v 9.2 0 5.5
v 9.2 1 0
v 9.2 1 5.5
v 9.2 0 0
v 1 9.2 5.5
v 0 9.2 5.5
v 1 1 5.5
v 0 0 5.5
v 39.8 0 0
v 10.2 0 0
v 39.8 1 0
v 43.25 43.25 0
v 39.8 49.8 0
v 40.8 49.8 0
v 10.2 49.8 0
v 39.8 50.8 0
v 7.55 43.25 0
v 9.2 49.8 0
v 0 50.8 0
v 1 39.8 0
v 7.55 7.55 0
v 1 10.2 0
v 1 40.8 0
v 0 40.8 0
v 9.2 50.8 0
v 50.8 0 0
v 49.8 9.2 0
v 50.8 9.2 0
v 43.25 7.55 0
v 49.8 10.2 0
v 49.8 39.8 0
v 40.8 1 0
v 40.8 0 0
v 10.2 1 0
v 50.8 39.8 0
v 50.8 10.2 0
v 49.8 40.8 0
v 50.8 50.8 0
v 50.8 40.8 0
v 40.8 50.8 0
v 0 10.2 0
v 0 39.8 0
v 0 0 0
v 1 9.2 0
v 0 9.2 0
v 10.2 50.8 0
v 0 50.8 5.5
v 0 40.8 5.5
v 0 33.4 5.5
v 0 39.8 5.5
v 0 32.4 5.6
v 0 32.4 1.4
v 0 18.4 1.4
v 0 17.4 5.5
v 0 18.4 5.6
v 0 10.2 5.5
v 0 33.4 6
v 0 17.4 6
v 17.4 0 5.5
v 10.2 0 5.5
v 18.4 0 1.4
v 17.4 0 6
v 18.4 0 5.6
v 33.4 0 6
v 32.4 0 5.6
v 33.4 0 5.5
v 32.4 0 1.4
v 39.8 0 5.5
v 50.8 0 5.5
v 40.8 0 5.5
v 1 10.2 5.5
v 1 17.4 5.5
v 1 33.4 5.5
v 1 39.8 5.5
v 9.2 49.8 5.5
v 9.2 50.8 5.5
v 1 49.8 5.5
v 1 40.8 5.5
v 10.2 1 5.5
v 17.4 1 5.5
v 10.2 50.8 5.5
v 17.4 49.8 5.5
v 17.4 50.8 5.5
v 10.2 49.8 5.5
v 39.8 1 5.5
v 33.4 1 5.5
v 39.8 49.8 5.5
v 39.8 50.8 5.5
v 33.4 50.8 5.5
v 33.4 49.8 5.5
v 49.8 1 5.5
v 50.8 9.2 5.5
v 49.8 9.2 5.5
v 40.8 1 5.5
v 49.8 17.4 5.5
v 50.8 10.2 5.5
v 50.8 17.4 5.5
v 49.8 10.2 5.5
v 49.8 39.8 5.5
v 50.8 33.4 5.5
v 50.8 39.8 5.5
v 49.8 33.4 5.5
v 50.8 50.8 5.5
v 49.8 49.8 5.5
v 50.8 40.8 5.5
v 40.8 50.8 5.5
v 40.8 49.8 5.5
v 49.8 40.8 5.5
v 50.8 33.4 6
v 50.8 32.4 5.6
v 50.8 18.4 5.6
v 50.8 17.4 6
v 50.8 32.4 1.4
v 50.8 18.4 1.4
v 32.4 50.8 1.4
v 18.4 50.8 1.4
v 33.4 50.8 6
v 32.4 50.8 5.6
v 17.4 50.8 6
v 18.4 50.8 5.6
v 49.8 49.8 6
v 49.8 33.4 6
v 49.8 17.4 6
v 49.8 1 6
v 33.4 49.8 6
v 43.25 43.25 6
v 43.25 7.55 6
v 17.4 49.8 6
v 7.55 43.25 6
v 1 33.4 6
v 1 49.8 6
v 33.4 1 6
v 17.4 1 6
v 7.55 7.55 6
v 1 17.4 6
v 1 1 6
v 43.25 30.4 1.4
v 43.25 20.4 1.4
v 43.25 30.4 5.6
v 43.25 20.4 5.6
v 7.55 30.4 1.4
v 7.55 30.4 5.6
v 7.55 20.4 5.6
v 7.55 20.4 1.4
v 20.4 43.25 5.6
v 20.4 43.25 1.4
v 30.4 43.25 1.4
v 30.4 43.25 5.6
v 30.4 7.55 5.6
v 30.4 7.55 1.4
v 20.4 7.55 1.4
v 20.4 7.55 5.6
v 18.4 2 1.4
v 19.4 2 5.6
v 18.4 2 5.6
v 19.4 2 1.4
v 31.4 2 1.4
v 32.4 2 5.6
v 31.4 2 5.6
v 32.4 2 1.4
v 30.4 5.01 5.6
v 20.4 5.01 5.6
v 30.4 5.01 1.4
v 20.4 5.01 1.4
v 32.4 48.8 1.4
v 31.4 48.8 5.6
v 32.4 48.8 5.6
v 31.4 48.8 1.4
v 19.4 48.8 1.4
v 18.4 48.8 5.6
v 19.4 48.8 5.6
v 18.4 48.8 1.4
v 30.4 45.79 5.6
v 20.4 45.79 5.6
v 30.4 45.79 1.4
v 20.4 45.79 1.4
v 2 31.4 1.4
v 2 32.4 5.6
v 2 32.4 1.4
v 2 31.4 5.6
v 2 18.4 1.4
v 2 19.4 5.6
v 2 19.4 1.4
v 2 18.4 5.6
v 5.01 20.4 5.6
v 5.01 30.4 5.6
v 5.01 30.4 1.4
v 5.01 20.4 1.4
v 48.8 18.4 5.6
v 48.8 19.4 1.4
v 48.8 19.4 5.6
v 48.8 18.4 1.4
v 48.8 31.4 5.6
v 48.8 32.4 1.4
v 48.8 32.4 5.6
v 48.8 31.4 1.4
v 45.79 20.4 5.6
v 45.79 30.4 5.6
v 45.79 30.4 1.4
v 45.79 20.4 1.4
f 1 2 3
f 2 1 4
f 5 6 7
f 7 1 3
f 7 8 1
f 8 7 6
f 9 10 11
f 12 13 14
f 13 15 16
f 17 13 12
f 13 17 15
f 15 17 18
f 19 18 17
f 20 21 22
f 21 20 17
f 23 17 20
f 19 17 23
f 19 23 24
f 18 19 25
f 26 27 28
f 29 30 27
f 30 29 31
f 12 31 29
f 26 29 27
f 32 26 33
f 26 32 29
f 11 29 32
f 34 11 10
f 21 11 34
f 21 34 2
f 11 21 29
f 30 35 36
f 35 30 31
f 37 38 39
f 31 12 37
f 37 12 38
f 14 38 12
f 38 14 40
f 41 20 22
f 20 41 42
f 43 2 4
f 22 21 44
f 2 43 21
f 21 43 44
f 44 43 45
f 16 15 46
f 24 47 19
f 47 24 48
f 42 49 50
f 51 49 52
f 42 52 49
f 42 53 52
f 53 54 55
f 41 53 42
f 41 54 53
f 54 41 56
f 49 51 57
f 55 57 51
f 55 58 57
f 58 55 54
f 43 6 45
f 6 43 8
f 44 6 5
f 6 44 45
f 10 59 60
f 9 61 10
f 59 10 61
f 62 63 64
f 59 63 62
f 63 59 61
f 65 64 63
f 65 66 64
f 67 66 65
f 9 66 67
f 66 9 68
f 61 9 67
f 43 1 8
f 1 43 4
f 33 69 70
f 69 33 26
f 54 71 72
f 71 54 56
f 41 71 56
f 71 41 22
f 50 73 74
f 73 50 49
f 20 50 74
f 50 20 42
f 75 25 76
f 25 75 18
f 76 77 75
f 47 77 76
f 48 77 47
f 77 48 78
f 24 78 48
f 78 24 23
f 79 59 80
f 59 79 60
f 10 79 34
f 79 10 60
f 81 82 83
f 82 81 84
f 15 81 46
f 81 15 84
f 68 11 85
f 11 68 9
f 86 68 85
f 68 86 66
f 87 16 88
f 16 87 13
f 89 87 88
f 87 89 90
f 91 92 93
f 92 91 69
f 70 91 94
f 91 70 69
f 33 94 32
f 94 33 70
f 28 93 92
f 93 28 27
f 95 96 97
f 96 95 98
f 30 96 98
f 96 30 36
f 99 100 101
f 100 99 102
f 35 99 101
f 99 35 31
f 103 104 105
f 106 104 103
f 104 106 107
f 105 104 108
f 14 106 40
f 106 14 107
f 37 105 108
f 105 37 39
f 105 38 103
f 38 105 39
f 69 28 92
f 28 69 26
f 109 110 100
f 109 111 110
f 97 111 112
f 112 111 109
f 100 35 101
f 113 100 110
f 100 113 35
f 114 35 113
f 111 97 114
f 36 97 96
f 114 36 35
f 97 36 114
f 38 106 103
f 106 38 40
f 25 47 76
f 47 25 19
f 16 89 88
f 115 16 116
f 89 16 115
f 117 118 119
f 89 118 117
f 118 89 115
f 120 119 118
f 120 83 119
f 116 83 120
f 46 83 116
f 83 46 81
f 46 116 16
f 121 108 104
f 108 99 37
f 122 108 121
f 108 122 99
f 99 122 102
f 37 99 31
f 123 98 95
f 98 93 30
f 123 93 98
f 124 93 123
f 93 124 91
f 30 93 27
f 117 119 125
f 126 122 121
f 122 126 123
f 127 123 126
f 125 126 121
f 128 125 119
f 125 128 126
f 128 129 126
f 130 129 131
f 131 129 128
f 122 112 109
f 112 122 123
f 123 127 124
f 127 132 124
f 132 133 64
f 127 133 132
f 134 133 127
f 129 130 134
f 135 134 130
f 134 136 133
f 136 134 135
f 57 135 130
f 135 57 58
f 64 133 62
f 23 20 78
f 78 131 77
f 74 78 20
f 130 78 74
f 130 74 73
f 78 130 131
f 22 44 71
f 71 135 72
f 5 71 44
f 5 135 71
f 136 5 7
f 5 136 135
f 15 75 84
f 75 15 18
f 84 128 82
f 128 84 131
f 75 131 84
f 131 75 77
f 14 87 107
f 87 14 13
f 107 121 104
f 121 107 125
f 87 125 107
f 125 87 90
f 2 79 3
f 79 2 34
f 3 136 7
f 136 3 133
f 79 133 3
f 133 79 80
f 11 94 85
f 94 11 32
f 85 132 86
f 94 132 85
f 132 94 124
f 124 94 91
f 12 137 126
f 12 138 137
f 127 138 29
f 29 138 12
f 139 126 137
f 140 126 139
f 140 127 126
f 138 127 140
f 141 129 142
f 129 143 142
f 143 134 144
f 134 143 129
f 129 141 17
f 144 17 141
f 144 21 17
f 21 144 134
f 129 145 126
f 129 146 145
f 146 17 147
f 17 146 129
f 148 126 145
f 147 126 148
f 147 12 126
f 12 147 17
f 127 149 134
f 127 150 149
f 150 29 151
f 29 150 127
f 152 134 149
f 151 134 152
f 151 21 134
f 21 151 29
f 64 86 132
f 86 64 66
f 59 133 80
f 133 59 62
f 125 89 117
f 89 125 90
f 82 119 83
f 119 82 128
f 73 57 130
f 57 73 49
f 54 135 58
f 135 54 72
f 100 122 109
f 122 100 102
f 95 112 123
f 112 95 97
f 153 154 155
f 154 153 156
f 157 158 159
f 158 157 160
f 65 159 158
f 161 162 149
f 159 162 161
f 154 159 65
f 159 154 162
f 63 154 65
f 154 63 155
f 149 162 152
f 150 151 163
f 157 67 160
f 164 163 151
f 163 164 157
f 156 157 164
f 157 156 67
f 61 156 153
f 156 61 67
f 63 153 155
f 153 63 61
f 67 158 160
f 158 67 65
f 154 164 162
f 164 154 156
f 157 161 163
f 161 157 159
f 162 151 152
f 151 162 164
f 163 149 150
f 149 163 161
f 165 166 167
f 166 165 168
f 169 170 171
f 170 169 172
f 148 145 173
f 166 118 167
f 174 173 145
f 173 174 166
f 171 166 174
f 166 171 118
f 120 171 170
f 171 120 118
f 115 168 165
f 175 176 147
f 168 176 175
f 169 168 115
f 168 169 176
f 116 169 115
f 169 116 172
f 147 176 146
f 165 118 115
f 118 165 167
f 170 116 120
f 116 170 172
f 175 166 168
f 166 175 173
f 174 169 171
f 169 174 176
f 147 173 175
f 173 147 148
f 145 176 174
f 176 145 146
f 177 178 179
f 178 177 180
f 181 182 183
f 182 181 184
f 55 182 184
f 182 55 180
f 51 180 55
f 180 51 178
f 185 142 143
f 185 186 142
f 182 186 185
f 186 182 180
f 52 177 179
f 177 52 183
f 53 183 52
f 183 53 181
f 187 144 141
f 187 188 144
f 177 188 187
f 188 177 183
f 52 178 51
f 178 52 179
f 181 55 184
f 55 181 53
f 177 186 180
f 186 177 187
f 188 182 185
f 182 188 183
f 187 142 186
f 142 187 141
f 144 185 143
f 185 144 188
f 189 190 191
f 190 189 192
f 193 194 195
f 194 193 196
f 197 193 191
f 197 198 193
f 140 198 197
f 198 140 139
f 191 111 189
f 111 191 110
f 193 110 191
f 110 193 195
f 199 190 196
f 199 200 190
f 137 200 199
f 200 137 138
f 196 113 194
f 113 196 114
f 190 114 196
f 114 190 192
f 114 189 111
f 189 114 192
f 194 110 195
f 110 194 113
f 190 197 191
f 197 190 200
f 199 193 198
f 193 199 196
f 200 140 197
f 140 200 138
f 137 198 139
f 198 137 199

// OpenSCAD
/* [Base Tile Size] */
x = 2; //[1,2,3,4,5,6]
y = 2; //[1,2,3,4,5,6]

/* [Square Basis] */
// What is the size in mm of a square?
square_basis = 25.4; // [25:Dwarven Forge/Hirstarts, 25.4:OpenLOCK, 31.75:Wyloch]

/*
 * Openlock connection bay
 */

module openlock_chamber(buffer=0) {
    translate([-buffer,-7,1.4]) cube([2+buffer,7*2,4.2]);
    hull() {
        translate([0,-6,1.4]) cube([2,6*2,4.2]);
        translate([3+0.01,-5,1.4]) cube([2,5*2,4.2]);
    }
    translate([5,-5,1.4]) cube([4,5*2,4.2]);
}

module openlock_supports(buffer=0) {
    translate([0-buffer*2,-0.5,1.4-buffer]) cube([10+buffer*2,1,4.2+buffer*2]);
}

module openlock_negative() {
    difference() {
        openlock_chamber(1);
        //openlock_supports(1);
    }
}

module fs_magnet_base(x,y,square_basis) {
    glue_pad = 16;
    glue_pad_buffer = 1;
    
    intx = x > 2 ? 2 : x;
    inty = y > 2 ? 2 : y;
    difference() {
        union() {
            translate([0,0,0]) difference() {
                stone_base(x,y,square_basis);
                translate([6.55,6.55,0]) translate([1,1,-1]) cube([square_basis*x-15.1,square_basis*y-15.1,8]);
            }
            translate([intx/2*square_basis-glue_pad/2,+1-glue_pad_buffer,0]) cube([glue_pad,6+glue_pad_buffer,6]); 
            translate([intx/2*square_basis-glue_pad/2,y*square_basis-7,0]) cube([glue_pad,6+glue_pad_buffer,6]); 
            if (x > 3) {
                translate([3*square_basis-glue_pad/2,+1-glue_pad_buffer,0]) cube([glue_pad,6+glue_pad_buffer,6]); 
                translate([3*square_basis-glue_pad/2,y*square_basis-7,0]) cube([glue_pad,6+glue_pad_buffer,6]); 
            }
                translate([+1-glue_pad_buffer,inty/2*square_basis-glue_pad/2,0]) cube([6+glue_pad_buffer,glue_pad,6]); 
                translate([x*square_basis-7,inty/2*square_basis-glue_pad/2,0]) cube([6+glue_pad_buffer,glue_pad,6]); 
            if (y > 3) {
                translate([+1-glue_pad_buffer,3*square_basis-glue_pad/2,0]) cube([6+glue_pad_buffer,glue_pad,6]); 
                translate([x*square_basis-7,3*square_basis-glue_pad/2,0]) cube([6+glue_pad_buffer,glue_pad,6]); 
            }
        }

        translate([square_basis*intx/2,0,0]) rotate([0,0,90]) openlock_negative();
        translate([square_basis*intx/2,square_basis*y,0]) rotate([0,0,-90]) openlock_negative();
        if (x > 3) {
            translate([square_basis*3,0,0]) rotate([0,0,90]) openlock_negative();
            translate([square_basis*3,square_basis*y,0]) rotate([0,0,-90]) openlock_negative();
        }

        translate([0,square_basis*inty/2,0]) openlock_negative();
        translate([square_basis*x,square_basis*inty/2,0]) rotate([0,0,180]) openlock_negative();
        if (y > 3) {
            translate([0,square_basis*3,0]) openlock_negative();
            translate([square_basis*x,square_basis*3,0]) rotate([0,0,180]) openlock_negative();
        }
    }
}

module stone_base(x,y,square_basis) {
    length = square_basis*x;
    width = square_basis*y;
    xblocks = floor(length / 10.2);
    yblocks = floor(width / 10.2);
    
    intersection() {
        union() {
            for (i = [0:xblocks]) {
                for (j = [0:yblocks]) {
                    if (i == 0 || j == 0 || i == xblocks || j == yblocks) {
                        translate([i*10.2,j*10.2,0]) cube([9.2 + (i==xblocks ? 10.2 : 0),9.2 + (j==yblocks ? 10.2 : 0),5.5]);
                    }
                }
            }
        }
        cube([length, width, 6]);
    }
    translate([1,1,0]) cube([length-2, width-2, 6]);
}

color("Grey") fs_magnet_base(x,y,square_basis);
